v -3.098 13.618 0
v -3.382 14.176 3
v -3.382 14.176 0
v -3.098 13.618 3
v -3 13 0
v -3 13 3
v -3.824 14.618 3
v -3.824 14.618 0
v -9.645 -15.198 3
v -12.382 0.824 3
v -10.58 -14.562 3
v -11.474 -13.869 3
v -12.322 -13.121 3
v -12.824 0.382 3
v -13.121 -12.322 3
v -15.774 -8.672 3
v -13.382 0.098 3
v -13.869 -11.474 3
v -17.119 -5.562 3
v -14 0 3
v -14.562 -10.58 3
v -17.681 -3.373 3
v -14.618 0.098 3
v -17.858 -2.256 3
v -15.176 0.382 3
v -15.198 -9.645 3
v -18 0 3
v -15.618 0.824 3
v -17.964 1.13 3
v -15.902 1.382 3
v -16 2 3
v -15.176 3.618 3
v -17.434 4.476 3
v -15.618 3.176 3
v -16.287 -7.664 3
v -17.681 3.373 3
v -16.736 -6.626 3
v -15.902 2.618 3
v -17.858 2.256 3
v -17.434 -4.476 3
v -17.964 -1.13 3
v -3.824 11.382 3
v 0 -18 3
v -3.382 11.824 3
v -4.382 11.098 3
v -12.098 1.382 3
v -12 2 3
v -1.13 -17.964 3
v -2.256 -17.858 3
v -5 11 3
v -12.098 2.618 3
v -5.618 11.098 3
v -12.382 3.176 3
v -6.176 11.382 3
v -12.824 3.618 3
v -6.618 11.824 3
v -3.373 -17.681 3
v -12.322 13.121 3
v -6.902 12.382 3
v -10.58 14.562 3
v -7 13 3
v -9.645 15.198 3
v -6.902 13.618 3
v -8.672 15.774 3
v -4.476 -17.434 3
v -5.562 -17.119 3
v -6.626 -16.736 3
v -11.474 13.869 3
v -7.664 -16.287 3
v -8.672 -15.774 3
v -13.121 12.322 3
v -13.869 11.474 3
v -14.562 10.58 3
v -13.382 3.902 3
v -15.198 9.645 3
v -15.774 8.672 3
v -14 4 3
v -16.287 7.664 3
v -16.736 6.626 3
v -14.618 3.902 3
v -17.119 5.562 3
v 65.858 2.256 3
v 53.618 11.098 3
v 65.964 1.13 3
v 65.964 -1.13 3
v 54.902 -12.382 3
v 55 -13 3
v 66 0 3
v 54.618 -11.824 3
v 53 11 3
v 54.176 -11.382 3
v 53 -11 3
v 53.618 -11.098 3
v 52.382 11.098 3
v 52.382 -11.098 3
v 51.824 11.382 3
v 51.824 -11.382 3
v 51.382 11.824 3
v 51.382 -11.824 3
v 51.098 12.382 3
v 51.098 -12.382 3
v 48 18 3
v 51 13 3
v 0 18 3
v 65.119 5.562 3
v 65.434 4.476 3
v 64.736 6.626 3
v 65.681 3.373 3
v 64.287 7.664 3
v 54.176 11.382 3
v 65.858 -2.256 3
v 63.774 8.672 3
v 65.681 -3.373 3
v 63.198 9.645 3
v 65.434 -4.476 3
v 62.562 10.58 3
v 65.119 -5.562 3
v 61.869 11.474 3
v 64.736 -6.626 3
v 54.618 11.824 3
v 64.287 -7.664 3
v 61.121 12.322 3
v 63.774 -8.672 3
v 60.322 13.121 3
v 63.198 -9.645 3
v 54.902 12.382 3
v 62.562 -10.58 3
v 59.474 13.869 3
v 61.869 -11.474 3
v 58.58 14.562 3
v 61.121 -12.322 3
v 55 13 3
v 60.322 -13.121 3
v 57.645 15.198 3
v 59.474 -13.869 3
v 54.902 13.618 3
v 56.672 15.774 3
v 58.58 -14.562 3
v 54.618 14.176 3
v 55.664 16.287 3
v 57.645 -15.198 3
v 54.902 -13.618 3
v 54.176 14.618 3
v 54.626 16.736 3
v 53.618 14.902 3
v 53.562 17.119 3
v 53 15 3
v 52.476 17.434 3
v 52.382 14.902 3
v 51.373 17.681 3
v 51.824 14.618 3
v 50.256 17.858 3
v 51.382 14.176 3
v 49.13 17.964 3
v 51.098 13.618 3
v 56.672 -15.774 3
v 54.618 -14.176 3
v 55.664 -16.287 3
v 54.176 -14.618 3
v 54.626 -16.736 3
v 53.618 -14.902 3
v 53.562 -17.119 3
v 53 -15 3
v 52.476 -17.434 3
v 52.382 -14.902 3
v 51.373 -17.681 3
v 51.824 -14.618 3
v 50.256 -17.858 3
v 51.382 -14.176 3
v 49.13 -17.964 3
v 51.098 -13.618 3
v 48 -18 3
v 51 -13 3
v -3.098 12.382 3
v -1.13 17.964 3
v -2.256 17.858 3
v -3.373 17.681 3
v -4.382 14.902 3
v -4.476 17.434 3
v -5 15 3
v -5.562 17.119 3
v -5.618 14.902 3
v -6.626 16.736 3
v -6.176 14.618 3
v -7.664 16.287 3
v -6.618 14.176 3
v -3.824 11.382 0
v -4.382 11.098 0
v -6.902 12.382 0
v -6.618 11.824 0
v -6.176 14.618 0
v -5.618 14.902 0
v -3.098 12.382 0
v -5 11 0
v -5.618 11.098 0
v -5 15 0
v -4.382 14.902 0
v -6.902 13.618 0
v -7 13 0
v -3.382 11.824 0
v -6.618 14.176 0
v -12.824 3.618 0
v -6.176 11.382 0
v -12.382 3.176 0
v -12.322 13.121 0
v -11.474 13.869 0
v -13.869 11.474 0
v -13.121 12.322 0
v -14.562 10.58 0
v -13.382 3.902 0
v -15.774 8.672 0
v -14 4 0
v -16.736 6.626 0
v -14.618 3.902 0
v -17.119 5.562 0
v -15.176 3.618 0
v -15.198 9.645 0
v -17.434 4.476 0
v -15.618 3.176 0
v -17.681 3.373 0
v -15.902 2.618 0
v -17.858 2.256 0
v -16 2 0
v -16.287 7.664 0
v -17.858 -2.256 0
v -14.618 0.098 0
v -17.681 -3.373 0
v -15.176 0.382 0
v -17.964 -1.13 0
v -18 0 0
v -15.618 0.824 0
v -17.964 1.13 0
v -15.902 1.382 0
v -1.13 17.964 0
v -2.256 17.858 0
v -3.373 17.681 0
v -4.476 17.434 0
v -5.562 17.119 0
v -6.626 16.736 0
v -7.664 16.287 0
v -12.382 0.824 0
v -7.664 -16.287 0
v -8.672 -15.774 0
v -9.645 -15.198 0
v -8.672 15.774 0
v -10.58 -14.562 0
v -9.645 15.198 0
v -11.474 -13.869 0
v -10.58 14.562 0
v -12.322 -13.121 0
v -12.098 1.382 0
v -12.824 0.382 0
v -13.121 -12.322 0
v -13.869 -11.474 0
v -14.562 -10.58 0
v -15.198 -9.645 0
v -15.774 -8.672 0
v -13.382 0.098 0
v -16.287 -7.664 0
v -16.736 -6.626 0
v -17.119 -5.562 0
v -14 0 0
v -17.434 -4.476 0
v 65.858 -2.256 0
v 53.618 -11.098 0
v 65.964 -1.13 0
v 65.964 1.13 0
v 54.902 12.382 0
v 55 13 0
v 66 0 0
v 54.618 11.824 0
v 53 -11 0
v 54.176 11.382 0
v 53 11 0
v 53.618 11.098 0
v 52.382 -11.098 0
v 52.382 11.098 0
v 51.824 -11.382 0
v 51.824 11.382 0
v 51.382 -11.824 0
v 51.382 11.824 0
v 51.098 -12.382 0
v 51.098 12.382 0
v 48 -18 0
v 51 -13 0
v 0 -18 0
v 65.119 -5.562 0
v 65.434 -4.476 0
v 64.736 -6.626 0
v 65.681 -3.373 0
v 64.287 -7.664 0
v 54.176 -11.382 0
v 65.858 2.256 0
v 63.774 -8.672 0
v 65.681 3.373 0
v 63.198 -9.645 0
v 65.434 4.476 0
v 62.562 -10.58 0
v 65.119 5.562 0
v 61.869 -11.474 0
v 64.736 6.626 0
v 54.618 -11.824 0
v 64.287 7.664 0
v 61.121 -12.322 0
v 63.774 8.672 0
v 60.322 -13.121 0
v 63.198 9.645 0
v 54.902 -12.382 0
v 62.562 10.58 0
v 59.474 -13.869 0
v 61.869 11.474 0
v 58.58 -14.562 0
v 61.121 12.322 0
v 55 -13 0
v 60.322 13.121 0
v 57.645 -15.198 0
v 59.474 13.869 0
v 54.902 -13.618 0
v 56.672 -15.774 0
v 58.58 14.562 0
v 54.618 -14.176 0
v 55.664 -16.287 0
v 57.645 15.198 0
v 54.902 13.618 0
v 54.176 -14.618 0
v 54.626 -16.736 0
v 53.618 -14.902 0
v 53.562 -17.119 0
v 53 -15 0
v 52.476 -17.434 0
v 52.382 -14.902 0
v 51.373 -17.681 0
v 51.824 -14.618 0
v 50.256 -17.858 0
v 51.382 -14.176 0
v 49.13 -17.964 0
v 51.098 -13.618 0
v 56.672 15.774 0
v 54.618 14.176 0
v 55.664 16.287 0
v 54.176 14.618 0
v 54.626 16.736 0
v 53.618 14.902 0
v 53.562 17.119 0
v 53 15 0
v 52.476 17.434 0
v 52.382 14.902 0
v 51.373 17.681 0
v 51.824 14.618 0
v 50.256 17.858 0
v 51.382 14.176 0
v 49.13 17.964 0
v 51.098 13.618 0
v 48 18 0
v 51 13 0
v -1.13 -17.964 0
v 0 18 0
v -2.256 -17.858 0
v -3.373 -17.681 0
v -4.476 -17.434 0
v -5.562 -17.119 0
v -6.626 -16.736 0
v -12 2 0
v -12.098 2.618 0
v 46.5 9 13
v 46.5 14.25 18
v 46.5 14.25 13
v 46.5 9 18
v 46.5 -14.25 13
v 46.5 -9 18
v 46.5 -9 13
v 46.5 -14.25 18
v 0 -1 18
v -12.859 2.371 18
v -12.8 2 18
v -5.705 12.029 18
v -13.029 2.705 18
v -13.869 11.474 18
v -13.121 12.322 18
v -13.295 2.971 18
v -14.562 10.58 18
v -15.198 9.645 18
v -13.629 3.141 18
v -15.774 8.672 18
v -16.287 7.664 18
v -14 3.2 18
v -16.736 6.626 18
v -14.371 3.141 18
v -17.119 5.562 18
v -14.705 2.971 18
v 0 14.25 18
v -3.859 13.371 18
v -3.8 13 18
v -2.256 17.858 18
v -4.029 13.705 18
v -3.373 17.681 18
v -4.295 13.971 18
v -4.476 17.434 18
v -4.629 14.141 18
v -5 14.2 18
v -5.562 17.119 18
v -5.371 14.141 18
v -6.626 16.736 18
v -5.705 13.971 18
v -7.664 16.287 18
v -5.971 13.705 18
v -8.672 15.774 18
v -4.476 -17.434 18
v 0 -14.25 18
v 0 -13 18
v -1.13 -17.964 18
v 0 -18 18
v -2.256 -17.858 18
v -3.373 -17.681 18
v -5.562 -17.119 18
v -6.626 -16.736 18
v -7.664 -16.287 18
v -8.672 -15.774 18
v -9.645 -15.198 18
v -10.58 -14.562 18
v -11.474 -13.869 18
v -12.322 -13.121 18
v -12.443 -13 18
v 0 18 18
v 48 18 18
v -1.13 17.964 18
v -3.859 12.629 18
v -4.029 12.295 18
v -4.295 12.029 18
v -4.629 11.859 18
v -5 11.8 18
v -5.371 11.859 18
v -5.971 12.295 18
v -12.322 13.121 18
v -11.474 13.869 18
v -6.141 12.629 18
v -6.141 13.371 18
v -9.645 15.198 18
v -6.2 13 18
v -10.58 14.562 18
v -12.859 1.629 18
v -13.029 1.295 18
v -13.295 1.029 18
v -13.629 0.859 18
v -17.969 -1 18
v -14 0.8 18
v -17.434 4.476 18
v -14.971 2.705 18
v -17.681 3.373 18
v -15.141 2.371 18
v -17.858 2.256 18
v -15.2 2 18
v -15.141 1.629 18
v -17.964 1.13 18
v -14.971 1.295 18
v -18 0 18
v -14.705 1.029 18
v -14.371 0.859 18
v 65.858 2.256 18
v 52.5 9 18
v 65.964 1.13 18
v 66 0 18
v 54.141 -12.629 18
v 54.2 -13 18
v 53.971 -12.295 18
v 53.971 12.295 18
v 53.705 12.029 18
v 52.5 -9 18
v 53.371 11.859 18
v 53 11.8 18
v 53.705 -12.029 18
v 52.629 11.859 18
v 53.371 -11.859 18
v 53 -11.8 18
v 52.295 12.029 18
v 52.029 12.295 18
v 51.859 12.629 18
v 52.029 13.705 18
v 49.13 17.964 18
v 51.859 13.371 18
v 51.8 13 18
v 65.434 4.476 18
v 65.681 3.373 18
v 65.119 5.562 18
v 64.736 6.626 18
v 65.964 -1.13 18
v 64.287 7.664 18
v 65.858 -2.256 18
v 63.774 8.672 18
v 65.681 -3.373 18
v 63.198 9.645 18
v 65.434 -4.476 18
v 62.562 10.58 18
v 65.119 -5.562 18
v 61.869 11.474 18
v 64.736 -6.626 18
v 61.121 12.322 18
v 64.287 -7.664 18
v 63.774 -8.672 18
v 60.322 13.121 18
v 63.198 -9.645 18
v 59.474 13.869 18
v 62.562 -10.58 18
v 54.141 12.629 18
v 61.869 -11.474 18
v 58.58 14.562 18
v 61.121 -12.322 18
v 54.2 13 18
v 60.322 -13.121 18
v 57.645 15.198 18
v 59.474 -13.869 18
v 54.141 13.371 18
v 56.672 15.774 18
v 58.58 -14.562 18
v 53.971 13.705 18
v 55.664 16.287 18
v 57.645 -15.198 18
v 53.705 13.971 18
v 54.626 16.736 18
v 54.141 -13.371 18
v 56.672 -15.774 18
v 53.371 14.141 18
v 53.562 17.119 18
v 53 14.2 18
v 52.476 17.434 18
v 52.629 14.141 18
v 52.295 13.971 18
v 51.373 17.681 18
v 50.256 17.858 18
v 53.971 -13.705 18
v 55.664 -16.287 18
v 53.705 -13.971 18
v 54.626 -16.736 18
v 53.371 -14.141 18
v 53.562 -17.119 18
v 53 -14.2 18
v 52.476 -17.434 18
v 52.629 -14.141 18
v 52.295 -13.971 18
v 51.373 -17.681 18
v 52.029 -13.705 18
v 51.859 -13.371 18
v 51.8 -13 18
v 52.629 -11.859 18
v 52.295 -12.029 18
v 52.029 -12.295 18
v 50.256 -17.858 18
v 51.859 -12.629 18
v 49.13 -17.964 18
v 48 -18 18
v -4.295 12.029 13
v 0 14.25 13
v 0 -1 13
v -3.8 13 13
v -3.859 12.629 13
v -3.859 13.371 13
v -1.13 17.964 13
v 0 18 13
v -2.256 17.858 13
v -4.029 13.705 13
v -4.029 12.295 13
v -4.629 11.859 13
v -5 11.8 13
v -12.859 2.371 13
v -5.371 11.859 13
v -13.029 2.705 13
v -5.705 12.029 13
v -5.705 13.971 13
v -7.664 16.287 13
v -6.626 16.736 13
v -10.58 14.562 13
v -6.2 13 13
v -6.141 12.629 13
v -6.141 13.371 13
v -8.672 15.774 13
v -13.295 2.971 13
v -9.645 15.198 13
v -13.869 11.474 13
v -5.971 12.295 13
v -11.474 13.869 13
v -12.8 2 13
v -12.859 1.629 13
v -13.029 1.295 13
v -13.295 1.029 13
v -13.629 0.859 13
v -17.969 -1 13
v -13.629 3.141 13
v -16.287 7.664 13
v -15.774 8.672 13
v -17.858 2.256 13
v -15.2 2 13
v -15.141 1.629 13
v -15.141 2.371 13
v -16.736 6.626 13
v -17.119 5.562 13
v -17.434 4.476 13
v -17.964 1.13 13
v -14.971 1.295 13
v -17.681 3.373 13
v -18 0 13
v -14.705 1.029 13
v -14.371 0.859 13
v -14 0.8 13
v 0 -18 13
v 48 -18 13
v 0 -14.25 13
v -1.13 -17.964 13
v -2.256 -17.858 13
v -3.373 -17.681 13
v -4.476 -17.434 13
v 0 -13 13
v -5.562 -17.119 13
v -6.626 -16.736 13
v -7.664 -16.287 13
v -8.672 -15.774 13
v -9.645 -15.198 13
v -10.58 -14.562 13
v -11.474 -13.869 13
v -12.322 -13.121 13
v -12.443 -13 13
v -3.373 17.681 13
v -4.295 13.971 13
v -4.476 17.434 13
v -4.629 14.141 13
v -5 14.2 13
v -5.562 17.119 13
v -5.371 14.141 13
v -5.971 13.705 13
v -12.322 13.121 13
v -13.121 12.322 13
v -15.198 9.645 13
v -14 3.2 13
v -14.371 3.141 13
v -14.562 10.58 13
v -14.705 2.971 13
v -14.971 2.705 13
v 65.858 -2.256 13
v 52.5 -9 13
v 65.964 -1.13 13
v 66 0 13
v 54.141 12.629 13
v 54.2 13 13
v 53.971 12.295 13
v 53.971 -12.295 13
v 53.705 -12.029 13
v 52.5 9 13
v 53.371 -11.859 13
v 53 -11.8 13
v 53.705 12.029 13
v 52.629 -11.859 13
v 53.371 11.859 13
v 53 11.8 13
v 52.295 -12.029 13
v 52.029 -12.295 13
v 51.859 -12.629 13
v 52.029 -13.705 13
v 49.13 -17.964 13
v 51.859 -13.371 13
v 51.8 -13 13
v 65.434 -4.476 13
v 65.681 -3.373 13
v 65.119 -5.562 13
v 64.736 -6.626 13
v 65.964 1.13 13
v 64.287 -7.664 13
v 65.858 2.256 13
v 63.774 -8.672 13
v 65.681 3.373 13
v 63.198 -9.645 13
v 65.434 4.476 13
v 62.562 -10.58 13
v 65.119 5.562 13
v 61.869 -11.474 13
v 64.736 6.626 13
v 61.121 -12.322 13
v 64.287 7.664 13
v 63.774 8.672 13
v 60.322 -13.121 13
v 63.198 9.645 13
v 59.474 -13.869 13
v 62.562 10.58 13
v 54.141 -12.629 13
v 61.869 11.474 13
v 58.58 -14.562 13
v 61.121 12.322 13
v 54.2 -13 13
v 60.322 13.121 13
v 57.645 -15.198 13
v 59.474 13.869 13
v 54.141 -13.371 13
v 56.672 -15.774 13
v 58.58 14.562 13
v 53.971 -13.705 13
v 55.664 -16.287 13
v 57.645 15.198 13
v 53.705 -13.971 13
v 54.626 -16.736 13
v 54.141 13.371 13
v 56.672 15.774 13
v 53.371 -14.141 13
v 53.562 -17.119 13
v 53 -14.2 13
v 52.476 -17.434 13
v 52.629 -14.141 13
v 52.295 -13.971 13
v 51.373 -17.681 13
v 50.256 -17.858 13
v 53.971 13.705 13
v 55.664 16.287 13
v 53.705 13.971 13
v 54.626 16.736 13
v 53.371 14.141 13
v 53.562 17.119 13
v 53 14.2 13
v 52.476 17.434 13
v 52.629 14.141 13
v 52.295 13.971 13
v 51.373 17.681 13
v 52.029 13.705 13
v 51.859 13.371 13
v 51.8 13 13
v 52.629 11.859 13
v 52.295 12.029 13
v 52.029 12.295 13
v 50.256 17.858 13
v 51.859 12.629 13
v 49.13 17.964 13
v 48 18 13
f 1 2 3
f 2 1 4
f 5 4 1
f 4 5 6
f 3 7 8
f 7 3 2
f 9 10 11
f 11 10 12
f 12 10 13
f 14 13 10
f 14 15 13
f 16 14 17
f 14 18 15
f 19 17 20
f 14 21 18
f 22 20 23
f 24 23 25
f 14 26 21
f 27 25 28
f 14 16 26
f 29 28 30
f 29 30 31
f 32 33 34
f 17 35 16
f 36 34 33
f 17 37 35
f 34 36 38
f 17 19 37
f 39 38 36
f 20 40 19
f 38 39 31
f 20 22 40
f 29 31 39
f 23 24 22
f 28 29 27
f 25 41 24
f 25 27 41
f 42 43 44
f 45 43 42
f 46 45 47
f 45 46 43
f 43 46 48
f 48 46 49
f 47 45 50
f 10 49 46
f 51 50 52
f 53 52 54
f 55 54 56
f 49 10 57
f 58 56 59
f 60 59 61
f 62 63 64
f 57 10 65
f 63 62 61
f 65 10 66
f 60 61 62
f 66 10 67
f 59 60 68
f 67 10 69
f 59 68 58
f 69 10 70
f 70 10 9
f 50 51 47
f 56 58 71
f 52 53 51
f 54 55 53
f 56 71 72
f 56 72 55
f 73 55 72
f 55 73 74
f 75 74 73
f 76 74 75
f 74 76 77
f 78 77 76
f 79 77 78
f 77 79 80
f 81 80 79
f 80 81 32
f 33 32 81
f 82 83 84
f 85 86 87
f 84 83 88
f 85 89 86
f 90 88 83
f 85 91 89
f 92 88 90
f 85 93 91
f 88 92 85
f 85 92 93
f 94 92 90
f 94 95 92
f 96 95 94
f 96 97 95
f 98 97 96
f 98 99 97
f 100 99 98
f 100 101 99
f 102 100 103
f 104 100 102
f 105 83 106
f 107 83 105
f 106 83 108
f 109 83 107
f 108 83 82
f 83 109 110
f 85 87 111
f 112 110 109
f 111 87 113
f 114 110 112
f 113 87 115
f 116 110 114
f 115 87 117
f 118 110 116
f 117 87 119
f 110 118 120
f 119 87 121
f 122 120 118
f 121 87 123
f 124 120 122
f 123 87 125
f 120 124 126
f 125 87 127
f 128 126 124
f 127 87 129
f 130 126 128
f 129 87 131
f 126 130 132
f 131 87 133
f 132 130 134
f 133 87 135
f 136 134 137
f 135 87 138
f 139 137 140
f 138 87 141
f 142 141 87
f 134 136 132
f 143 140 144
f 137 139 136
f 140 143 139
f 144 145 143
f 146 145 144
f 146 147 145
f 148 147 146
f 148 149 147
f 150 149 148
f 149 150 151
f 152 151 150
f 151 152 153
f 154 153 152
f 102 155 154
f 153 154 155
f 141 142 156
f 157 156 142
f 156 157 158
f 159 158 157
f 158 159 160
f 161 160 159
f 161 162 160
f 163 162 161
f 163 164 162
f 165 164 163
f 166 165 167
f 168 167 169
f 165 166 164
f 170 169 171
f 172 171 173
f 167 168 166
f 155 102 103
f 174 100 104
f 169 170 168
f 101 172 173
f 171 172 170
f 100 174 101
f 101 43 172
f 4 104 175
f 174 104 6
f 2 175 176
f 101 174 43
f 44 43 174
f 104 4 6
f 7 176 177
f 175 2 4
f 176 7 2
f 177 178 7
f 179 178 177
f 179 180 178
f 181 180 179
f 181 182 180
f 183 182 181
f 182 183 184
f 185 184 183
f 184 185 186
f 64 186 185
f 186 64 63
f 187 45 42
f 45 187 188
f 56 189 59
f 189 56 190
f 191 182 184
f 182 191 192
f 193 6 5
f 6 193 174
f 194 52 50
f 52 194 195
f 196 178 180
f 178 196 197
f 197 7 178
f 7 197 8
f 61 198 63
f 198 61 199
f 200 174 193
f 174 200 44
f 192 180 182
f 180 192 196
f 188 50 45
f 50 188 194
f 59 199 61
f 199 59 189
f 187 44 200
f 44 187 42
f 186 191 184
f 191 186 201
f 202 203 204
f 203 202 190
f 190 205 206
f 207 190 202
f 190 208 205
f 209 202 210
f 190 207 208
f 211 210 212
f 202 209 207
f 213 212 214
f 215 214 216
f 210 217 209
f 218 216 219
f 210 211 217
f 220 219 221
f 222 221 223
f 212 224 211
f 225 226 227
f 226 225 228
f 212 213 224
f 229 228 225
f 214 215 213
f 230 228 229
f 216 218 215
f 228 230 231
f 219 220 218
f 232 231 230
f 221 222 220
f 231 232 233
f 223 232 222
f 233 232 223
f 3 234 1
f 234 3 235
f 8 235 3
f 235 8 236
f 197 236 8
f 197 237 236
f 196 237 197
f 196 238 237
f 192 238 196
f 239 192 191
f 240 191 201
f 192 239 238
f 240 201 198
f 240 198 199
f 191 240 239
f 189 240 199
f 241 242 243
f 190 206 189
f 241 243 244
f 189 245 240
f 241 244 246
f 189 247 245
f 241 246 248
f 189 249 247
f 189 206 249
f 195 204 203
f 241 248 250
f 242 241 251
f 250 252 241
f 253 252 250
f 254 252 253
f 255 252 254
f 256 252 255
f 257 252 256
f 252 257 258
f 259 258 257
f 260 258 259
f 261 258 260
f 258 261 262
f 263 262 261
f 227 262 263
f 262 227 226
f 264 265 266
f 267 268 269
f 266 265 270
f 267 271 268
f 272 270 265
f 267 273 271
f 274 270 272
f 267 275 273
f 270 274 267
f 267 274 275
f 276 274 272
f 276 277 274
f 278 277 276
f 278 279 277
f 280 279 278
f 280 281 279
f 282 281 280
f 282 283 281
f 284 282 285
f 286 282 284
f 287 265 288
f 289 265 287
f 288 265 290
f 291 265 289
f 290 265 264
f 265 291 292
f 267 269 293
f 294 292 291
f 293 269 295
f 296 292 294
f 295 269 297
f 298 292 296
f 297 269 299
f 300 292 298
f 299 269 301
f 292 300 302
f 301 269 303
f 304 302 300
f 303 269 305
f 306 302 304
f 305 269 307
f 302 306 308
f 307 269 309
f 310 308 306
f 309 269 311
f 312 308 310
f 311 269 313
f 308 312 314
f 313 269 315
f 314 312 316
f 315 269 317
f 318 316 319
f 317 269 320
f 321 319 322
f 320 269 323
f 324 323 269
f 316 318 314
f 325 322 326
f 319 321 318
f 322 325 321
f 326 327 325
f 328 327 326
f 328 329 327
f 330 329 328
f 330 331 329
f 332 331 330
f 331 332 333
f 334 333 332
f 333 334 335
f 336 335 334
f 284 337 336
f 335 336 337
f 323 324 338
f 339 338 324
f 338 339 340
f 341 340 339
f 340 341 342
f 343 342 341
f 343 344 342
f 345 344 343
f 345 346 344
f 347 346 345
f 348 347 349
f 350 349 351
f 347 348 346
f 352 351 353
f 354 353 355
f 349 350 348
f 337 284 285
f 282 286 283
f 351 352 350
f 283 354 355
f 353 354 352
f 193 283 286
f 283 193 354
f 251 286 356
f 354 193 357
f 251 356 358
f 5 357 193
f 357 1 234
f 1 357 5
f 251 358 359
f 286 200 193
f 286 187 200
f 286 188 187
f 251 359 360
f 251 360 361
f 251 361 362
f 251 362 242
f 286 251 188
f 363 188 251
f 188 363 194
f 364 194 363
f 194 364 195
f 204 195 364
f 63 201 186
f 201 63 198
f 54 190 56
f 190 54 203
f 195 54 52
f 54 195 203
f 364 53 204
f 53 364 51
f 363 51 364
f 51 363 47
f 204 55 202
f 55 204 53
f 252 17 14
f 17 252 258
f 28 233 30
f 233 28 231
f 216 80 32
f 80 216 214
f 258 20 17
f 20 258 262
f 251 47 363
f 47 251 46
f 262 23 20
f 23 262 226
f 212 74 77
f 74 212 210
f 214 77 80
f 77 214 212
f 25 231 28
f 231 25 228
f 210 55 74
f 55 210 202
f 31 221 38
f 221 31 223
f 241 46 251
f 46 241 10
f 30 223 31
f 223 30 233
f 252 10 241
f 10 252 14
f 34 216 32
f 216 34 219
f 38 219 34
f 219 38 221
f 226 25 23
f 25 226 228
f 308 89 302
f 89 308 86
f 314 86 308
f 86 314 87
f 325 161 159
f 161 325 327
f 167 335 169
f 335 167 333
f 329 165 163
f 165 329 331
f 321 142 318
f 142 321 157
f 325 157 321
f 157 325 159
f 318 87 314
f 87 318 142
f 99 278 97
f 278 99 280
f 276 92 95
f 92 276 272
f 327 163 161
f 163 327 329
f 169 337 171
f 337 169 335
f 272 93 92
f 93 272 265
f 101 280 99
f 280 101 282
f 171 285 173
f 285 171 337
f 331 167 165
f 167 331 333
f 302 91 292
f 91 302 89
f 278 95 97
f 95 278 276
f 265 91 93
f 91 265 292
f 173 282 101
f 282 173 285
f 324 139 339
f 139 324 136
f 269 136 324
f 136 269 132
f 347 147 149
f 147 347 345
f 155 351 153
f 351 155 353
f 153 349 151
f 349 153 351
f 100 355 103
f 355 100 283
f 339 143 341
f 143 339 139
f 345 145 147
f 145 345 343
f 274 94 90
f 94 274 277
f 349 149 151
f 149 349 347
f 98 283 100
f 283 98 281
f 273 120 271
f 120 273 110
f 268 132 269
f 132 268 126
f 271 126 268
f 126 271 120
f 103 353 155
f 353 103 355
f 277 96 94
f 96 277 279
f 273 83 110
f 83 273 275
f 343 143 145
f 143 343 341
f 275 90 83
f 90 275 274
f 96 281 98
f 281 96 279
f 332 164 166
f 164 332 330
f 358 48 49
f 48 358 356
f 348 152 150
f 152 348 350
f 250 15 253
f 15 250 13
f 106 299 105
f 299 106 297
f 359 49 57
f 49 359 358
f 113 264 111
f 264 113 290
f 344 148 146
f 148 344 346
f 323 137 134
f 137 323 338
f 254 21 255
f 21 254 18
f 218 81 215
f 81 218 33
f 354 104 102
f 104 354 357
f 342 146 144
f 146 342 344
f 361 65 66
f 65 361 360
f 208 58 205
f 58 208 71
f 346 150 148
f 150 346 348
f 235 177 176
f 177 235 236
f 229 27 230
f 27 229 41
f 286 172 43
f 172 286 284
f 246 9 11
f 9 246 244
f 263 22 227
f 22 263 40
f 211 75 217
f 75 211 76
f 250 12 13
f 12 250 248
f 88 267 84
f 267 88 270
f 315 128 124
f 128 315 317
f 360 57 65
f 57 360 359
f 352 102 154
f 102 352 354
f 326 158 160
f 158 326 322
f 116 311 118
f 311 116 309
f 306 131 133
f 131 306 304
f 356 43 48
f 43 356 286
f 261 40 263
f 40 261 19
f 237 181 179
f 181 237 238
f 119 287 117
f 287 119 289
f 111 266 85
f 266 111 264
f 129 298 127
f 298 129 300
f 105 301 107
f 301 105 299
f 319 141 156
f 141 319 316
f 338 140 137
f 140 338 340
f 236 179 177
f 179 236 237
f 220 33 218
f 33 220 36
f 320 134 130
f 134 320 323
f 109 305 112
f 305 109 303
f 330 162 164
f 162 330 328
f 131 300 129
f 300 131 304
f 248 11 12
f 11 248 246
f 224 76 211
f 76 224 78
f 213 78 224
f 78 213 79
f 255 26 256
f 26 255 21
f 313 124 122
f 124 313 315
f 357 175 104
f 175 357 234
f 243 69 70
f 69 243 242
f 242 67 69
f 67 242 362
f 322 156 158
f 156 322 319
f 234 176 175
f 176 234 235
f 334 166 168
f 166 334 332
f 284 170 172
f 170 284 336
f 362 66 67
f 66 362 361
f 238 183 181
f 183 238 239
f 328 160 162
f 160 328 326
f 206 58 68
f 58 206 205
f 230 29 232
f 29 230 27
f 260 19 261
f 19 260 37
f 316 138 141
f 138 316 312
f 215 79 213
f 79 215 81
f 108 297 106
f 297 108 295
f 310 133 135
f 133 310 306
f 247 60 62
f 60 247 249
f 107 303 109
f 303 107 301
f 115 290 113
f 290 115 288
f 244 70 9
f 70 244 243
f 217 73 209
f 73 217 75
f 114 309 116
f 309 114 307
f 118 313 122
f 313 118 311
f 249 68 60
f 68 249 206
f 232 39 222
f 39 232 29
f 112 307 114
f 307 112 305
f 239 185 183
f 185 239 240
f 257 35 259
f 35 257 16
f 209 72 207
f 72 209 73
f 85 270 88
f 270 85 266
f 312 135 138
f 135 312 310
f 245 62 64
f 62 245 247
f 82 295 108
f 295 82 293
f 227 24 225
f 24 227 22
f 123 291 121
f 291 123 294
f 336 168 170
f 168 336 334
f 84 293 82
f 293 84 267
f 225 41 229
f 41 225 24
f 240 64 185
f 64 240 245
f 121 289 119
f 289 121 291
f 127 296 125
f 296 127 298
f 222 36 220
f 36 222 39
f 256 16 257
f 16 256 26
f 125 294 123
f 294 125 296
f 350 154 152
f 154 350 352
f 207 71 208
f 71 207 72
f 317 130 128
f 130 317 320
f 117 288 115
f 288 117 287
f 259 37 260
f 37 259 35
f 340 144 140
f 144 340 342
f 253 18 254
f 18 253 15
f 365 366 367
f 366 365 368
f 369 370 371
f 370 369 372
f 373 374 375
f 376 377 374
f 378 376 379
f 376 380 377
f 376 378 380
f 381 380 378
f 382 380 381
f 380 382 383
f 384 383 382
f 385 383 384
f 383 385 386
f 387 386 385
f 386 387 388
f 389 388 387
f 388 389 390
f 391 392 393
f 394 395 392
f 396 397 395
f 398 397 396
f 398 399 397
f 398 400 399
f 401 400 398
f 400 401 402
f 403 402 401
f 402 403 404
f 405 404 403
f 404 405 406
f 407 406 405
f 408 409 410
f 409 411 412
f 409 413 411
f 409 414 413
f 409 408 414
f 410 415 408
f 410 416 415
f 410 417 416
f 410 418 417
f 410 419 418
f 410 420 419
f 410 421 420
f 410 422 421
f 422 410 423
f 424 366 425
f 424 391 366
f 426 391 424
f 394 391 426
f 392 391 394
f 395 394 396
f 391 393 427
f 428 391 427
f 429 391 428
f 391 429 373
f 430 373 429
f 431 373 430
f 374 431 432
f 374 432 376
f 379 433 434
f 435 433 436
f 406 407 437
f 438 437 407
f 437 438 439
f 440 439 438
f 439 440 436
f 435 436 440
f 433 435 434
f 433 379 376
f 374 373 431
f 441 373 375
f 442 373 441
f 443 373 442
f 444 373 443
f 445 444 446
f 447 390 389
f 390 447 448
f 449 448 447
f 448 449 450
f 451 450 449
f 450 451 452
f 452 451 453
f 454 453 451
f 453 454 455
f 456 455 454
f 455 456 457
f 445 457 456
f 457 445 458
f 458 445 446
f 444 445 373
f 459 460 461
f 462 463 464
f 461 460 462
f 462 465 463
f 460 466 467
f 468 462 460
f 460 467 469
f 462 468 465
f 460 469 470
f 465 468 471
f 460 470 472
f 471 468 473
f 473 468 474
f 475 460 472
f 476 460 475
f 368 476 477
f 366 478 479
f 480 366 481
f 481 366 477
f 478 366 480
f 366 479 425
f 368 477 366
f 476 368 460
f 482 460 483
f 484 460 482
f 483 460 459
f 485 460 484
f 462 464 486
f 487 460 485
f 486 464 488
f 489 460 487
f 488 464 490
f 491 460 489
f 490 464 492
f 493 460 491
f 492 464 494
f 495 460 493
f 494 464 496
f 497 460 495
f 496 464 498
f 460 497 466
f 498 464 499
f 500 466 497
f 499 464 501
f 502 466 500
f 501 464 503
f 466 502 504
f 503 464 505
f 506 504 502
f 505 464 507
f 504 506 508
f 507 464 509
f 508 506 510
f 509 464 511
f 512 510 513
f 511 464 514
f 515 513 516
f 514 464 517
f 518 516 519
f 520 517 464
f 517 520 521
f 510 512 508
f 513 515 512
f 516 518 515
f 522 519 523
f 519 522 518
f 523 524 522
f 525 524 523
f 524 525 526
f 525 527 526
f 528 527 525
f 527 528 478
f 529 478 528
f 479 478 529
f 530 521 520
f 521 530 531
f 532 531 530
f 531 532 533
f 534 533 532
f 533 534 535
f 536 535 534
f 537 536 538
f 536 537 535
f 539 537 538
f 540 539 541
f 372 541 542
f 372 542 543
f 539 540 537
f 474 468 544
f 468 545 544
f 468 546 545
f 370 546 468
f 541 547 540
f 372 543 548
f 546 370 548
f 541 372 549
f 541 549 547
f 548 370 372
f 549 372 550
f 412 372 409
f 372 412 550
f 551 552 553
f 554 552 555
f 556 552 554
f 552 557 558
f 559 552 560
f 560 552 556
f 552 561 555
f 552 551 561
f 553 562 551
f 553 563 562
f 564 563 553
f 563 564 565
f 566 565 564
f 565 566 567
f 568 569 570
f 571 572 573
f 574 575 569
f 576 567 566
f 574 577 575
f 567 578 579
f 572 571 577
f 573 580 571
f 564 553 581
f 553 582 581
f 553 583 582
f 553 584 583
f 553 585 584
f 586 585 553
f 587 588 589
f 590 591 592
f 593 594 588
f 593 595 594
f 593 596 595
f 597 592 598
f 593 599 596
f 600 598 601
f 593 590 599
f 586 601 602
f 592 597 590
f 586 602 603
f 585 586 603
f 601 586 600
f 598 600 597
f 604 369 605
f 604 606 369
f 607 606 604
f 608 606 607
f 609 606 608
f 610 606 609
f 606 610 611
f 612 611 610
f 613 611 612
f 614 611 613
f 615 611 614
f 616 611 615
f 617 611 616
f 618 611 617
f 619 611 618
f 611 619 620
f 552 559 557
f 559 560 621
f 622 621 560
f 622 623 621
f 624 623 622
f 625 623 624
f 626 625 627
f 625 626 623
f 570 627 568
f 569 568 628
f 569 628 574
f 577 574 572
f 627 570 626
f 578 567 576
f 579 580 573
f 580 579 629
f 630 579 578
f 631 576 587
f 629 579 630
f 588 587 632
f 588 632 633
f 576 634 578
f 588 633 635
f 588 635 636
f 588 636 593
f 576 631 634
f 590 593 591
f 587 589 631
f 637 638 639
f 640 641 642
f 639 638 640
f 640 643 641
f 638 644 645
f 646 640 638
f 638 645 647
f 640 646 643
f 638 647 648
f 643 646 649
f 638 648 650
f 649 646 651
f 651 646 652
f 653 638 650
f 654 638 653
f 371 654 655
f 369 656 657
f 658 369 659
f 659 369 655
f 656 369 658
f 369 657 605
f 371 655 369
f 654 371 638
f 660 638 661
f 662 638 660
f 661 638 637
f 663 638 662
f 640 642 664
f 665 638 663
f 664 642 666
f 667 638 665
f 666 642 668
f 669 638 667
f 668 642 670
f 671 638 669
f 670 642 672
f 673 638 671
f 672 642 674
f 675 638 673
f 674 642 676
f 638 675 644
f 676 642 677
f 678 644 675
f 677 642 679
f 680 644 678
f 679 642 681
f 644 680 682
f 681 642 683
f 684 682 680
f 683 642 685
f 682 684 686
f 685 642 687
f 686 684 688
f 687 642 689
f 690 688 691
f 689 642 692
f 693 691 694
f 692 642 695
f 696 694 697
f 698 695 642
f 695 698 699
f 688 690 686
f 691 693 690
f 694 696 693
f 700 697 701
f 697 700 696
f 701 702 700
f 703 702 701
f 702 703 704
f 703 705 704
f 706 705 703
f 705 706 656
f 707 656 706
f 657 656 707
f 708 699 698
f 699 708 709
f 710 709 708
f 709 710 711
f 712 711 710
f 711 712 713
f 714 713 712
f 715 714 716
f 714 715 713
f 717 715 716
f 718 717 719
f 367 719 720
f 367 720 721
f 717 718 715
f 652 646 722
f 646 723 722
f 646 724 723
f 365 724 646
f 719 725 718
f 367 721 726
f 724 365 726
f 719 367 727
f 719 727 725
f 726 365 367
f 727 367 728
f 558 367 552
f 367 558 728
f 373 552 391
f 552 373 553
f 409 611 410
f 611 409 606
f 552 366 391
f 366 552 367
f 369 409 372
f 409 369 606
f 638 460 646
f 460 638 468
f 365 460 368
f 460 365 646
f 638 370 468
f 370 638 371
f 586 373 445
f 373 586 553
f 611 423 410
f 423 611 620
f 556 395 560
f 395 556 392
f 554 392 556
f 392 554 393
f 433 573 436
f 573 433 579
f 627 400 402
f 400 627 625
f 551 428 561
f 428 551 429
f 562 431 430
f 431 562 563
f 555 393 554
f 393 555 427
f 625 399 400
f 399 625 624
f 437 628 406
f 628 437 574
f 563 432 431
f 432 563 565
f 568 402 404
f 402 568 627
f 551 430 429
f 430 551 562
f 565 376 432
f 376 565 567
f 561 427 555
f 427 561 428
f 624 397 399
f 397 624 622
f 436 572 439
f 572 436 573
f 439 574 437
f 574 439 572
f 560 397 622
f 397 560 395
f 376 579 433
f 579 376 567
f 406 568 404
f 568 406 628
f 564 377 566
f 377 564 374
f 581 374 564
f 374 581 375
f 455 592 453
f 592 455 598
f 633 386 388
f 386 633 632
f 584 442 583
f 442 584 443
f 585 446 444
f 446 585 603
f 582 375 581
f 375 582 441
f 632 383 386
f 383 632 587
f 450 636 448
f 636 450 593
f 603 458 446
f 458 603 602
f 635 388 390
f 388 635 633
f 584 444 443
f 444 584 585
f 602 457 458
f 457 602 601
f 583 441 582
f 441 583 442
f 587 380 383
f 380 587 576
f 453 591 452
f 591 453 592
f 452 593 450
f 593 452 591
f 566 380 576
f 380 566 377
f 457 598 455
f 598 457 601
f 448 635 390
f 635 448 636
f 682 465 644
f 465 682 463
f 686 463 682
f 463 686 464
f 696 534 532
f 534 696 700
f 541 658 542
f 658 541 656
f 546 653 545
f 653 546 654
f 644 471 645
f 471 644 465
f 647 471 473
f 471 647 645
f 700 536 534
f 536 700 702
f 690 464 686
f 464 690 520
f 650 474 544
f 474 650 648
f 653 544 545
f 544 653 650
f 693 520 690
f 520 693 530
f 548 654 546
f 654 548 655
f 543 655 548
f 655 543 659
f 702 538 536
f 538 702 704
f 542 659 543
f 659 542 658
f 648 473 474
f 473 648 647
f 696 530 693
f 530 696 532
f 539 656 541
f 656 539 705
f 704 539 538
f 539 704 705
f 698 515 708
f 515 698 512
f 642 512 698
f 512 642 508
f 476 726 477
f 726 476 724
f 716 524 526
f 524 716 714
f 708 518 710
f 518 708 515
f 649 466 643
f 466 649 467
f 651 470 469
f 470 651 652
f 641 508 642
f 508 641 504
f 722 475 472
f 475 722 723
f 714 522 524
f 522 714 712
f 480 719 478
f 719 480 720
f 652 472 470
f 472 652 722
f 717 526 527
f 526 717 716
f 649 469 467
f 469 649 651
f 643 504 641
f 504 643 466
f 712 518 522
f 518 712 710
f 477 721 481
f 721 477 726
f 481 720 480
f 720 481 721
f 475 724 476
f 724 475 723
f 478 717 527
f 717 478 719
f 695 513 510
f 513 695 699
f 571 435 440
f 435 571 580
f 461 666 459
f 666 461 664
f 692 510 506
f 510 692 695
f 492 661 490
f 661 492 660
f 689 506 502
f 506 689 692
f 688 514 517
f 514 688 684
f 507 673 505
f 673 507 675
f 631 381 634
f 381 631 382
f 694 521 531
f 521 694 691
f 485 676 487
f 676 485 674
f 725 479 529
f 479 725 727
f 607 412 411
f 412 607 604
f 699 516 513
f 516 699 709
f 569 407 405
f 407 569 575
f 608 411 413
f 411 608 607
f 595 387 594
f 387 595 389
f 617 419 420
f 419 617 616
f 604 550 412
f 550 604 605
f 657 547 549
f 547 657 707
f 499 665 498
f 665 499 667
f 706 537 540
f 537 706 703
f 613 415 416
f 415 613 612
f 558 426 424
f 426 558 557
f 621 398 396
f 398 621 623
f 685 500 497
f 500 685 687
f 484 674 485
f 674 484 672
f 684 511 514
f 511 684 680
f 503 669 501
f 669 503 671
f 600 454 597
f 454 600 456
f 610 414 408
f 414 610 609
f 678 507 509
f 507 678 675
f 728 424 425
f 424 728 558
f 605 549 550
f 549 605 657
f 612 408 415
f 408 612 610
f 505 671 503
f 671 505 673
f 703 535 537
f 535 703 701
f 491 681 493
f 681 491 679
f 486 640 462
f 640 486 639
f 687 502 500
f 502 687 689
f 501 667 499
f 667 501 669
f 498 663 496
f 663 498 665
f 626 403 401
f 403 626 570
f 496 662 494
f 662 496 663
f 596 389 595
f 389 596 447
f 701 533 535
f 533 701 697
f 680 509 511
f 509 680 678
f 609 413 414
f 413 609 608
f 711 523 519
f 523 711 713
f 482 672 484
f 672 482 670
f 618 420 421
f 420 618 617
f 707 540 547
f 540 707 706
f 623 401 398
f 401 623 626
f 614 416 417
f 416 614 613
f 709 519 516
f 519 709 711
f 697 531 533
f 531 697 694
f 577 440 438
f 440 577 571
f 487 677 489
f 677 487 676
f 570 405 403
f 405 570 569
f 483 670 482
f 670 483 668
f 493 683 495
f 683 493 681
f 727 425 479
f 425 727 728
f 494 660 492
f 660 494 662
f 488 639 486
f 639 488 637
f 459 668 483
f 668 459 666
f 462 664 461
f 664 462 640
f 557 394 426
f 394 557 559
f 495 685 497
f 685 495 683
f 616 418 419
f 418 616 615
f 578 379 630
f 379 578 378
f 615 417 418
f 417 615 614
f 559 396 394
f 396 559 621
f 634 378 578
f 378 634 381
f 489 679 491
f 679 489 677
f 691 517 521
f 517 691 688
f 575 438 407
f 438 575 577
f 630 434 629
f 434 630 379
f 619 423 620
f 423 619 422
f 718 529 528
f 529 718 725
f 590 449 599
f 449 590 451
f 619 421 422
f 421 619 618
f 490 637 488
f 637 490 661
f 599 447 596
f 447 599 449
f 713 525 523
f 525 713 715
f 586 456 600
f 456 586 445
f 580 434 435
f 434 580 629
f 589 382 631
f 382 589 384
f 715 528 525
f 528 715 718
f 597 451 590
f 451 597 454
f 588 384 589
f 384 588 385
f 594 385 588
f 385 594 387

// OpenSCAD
// heya relais

x=48;
y=30;
z=5;

e=3;

ecl=10;

difference()
{
    silouette(3);
    trous() cylinder(3,2,2,$fn=20);
}

translate([0,0,3+ecl]) difference()
{
    silouette(5);
    esp(5);
    trous() cylinder(5,1.2,1.2,$fn=20);
}

//translate([0,0,3+5+2*ecl]) silouette(3);

module silouette(h)
{
   hull()
   {
    cylinder(h,y/2+e,y/2+e,$fn=100);
    translate([x,0,0]) cylinder(h,y/2+e,y/2+e,$fn=100);
   }
}

module esp(h)
{
    translate([0,-28.5/2,0]) cube([46.5,28.5,h]);
    translate([46.5,-18/2,0]) cube([6,18,h]);
    translate([-20,-13,0]) cube([20,12,h]);
    
}

module trous()
{
    translate([-5,y/2-2,0]) children();
    translate([-14,2,0]) children();

    translate([x+5,-y/2+2,0]) children();
    translate([x+5,y/2-2,0]) children();
}
